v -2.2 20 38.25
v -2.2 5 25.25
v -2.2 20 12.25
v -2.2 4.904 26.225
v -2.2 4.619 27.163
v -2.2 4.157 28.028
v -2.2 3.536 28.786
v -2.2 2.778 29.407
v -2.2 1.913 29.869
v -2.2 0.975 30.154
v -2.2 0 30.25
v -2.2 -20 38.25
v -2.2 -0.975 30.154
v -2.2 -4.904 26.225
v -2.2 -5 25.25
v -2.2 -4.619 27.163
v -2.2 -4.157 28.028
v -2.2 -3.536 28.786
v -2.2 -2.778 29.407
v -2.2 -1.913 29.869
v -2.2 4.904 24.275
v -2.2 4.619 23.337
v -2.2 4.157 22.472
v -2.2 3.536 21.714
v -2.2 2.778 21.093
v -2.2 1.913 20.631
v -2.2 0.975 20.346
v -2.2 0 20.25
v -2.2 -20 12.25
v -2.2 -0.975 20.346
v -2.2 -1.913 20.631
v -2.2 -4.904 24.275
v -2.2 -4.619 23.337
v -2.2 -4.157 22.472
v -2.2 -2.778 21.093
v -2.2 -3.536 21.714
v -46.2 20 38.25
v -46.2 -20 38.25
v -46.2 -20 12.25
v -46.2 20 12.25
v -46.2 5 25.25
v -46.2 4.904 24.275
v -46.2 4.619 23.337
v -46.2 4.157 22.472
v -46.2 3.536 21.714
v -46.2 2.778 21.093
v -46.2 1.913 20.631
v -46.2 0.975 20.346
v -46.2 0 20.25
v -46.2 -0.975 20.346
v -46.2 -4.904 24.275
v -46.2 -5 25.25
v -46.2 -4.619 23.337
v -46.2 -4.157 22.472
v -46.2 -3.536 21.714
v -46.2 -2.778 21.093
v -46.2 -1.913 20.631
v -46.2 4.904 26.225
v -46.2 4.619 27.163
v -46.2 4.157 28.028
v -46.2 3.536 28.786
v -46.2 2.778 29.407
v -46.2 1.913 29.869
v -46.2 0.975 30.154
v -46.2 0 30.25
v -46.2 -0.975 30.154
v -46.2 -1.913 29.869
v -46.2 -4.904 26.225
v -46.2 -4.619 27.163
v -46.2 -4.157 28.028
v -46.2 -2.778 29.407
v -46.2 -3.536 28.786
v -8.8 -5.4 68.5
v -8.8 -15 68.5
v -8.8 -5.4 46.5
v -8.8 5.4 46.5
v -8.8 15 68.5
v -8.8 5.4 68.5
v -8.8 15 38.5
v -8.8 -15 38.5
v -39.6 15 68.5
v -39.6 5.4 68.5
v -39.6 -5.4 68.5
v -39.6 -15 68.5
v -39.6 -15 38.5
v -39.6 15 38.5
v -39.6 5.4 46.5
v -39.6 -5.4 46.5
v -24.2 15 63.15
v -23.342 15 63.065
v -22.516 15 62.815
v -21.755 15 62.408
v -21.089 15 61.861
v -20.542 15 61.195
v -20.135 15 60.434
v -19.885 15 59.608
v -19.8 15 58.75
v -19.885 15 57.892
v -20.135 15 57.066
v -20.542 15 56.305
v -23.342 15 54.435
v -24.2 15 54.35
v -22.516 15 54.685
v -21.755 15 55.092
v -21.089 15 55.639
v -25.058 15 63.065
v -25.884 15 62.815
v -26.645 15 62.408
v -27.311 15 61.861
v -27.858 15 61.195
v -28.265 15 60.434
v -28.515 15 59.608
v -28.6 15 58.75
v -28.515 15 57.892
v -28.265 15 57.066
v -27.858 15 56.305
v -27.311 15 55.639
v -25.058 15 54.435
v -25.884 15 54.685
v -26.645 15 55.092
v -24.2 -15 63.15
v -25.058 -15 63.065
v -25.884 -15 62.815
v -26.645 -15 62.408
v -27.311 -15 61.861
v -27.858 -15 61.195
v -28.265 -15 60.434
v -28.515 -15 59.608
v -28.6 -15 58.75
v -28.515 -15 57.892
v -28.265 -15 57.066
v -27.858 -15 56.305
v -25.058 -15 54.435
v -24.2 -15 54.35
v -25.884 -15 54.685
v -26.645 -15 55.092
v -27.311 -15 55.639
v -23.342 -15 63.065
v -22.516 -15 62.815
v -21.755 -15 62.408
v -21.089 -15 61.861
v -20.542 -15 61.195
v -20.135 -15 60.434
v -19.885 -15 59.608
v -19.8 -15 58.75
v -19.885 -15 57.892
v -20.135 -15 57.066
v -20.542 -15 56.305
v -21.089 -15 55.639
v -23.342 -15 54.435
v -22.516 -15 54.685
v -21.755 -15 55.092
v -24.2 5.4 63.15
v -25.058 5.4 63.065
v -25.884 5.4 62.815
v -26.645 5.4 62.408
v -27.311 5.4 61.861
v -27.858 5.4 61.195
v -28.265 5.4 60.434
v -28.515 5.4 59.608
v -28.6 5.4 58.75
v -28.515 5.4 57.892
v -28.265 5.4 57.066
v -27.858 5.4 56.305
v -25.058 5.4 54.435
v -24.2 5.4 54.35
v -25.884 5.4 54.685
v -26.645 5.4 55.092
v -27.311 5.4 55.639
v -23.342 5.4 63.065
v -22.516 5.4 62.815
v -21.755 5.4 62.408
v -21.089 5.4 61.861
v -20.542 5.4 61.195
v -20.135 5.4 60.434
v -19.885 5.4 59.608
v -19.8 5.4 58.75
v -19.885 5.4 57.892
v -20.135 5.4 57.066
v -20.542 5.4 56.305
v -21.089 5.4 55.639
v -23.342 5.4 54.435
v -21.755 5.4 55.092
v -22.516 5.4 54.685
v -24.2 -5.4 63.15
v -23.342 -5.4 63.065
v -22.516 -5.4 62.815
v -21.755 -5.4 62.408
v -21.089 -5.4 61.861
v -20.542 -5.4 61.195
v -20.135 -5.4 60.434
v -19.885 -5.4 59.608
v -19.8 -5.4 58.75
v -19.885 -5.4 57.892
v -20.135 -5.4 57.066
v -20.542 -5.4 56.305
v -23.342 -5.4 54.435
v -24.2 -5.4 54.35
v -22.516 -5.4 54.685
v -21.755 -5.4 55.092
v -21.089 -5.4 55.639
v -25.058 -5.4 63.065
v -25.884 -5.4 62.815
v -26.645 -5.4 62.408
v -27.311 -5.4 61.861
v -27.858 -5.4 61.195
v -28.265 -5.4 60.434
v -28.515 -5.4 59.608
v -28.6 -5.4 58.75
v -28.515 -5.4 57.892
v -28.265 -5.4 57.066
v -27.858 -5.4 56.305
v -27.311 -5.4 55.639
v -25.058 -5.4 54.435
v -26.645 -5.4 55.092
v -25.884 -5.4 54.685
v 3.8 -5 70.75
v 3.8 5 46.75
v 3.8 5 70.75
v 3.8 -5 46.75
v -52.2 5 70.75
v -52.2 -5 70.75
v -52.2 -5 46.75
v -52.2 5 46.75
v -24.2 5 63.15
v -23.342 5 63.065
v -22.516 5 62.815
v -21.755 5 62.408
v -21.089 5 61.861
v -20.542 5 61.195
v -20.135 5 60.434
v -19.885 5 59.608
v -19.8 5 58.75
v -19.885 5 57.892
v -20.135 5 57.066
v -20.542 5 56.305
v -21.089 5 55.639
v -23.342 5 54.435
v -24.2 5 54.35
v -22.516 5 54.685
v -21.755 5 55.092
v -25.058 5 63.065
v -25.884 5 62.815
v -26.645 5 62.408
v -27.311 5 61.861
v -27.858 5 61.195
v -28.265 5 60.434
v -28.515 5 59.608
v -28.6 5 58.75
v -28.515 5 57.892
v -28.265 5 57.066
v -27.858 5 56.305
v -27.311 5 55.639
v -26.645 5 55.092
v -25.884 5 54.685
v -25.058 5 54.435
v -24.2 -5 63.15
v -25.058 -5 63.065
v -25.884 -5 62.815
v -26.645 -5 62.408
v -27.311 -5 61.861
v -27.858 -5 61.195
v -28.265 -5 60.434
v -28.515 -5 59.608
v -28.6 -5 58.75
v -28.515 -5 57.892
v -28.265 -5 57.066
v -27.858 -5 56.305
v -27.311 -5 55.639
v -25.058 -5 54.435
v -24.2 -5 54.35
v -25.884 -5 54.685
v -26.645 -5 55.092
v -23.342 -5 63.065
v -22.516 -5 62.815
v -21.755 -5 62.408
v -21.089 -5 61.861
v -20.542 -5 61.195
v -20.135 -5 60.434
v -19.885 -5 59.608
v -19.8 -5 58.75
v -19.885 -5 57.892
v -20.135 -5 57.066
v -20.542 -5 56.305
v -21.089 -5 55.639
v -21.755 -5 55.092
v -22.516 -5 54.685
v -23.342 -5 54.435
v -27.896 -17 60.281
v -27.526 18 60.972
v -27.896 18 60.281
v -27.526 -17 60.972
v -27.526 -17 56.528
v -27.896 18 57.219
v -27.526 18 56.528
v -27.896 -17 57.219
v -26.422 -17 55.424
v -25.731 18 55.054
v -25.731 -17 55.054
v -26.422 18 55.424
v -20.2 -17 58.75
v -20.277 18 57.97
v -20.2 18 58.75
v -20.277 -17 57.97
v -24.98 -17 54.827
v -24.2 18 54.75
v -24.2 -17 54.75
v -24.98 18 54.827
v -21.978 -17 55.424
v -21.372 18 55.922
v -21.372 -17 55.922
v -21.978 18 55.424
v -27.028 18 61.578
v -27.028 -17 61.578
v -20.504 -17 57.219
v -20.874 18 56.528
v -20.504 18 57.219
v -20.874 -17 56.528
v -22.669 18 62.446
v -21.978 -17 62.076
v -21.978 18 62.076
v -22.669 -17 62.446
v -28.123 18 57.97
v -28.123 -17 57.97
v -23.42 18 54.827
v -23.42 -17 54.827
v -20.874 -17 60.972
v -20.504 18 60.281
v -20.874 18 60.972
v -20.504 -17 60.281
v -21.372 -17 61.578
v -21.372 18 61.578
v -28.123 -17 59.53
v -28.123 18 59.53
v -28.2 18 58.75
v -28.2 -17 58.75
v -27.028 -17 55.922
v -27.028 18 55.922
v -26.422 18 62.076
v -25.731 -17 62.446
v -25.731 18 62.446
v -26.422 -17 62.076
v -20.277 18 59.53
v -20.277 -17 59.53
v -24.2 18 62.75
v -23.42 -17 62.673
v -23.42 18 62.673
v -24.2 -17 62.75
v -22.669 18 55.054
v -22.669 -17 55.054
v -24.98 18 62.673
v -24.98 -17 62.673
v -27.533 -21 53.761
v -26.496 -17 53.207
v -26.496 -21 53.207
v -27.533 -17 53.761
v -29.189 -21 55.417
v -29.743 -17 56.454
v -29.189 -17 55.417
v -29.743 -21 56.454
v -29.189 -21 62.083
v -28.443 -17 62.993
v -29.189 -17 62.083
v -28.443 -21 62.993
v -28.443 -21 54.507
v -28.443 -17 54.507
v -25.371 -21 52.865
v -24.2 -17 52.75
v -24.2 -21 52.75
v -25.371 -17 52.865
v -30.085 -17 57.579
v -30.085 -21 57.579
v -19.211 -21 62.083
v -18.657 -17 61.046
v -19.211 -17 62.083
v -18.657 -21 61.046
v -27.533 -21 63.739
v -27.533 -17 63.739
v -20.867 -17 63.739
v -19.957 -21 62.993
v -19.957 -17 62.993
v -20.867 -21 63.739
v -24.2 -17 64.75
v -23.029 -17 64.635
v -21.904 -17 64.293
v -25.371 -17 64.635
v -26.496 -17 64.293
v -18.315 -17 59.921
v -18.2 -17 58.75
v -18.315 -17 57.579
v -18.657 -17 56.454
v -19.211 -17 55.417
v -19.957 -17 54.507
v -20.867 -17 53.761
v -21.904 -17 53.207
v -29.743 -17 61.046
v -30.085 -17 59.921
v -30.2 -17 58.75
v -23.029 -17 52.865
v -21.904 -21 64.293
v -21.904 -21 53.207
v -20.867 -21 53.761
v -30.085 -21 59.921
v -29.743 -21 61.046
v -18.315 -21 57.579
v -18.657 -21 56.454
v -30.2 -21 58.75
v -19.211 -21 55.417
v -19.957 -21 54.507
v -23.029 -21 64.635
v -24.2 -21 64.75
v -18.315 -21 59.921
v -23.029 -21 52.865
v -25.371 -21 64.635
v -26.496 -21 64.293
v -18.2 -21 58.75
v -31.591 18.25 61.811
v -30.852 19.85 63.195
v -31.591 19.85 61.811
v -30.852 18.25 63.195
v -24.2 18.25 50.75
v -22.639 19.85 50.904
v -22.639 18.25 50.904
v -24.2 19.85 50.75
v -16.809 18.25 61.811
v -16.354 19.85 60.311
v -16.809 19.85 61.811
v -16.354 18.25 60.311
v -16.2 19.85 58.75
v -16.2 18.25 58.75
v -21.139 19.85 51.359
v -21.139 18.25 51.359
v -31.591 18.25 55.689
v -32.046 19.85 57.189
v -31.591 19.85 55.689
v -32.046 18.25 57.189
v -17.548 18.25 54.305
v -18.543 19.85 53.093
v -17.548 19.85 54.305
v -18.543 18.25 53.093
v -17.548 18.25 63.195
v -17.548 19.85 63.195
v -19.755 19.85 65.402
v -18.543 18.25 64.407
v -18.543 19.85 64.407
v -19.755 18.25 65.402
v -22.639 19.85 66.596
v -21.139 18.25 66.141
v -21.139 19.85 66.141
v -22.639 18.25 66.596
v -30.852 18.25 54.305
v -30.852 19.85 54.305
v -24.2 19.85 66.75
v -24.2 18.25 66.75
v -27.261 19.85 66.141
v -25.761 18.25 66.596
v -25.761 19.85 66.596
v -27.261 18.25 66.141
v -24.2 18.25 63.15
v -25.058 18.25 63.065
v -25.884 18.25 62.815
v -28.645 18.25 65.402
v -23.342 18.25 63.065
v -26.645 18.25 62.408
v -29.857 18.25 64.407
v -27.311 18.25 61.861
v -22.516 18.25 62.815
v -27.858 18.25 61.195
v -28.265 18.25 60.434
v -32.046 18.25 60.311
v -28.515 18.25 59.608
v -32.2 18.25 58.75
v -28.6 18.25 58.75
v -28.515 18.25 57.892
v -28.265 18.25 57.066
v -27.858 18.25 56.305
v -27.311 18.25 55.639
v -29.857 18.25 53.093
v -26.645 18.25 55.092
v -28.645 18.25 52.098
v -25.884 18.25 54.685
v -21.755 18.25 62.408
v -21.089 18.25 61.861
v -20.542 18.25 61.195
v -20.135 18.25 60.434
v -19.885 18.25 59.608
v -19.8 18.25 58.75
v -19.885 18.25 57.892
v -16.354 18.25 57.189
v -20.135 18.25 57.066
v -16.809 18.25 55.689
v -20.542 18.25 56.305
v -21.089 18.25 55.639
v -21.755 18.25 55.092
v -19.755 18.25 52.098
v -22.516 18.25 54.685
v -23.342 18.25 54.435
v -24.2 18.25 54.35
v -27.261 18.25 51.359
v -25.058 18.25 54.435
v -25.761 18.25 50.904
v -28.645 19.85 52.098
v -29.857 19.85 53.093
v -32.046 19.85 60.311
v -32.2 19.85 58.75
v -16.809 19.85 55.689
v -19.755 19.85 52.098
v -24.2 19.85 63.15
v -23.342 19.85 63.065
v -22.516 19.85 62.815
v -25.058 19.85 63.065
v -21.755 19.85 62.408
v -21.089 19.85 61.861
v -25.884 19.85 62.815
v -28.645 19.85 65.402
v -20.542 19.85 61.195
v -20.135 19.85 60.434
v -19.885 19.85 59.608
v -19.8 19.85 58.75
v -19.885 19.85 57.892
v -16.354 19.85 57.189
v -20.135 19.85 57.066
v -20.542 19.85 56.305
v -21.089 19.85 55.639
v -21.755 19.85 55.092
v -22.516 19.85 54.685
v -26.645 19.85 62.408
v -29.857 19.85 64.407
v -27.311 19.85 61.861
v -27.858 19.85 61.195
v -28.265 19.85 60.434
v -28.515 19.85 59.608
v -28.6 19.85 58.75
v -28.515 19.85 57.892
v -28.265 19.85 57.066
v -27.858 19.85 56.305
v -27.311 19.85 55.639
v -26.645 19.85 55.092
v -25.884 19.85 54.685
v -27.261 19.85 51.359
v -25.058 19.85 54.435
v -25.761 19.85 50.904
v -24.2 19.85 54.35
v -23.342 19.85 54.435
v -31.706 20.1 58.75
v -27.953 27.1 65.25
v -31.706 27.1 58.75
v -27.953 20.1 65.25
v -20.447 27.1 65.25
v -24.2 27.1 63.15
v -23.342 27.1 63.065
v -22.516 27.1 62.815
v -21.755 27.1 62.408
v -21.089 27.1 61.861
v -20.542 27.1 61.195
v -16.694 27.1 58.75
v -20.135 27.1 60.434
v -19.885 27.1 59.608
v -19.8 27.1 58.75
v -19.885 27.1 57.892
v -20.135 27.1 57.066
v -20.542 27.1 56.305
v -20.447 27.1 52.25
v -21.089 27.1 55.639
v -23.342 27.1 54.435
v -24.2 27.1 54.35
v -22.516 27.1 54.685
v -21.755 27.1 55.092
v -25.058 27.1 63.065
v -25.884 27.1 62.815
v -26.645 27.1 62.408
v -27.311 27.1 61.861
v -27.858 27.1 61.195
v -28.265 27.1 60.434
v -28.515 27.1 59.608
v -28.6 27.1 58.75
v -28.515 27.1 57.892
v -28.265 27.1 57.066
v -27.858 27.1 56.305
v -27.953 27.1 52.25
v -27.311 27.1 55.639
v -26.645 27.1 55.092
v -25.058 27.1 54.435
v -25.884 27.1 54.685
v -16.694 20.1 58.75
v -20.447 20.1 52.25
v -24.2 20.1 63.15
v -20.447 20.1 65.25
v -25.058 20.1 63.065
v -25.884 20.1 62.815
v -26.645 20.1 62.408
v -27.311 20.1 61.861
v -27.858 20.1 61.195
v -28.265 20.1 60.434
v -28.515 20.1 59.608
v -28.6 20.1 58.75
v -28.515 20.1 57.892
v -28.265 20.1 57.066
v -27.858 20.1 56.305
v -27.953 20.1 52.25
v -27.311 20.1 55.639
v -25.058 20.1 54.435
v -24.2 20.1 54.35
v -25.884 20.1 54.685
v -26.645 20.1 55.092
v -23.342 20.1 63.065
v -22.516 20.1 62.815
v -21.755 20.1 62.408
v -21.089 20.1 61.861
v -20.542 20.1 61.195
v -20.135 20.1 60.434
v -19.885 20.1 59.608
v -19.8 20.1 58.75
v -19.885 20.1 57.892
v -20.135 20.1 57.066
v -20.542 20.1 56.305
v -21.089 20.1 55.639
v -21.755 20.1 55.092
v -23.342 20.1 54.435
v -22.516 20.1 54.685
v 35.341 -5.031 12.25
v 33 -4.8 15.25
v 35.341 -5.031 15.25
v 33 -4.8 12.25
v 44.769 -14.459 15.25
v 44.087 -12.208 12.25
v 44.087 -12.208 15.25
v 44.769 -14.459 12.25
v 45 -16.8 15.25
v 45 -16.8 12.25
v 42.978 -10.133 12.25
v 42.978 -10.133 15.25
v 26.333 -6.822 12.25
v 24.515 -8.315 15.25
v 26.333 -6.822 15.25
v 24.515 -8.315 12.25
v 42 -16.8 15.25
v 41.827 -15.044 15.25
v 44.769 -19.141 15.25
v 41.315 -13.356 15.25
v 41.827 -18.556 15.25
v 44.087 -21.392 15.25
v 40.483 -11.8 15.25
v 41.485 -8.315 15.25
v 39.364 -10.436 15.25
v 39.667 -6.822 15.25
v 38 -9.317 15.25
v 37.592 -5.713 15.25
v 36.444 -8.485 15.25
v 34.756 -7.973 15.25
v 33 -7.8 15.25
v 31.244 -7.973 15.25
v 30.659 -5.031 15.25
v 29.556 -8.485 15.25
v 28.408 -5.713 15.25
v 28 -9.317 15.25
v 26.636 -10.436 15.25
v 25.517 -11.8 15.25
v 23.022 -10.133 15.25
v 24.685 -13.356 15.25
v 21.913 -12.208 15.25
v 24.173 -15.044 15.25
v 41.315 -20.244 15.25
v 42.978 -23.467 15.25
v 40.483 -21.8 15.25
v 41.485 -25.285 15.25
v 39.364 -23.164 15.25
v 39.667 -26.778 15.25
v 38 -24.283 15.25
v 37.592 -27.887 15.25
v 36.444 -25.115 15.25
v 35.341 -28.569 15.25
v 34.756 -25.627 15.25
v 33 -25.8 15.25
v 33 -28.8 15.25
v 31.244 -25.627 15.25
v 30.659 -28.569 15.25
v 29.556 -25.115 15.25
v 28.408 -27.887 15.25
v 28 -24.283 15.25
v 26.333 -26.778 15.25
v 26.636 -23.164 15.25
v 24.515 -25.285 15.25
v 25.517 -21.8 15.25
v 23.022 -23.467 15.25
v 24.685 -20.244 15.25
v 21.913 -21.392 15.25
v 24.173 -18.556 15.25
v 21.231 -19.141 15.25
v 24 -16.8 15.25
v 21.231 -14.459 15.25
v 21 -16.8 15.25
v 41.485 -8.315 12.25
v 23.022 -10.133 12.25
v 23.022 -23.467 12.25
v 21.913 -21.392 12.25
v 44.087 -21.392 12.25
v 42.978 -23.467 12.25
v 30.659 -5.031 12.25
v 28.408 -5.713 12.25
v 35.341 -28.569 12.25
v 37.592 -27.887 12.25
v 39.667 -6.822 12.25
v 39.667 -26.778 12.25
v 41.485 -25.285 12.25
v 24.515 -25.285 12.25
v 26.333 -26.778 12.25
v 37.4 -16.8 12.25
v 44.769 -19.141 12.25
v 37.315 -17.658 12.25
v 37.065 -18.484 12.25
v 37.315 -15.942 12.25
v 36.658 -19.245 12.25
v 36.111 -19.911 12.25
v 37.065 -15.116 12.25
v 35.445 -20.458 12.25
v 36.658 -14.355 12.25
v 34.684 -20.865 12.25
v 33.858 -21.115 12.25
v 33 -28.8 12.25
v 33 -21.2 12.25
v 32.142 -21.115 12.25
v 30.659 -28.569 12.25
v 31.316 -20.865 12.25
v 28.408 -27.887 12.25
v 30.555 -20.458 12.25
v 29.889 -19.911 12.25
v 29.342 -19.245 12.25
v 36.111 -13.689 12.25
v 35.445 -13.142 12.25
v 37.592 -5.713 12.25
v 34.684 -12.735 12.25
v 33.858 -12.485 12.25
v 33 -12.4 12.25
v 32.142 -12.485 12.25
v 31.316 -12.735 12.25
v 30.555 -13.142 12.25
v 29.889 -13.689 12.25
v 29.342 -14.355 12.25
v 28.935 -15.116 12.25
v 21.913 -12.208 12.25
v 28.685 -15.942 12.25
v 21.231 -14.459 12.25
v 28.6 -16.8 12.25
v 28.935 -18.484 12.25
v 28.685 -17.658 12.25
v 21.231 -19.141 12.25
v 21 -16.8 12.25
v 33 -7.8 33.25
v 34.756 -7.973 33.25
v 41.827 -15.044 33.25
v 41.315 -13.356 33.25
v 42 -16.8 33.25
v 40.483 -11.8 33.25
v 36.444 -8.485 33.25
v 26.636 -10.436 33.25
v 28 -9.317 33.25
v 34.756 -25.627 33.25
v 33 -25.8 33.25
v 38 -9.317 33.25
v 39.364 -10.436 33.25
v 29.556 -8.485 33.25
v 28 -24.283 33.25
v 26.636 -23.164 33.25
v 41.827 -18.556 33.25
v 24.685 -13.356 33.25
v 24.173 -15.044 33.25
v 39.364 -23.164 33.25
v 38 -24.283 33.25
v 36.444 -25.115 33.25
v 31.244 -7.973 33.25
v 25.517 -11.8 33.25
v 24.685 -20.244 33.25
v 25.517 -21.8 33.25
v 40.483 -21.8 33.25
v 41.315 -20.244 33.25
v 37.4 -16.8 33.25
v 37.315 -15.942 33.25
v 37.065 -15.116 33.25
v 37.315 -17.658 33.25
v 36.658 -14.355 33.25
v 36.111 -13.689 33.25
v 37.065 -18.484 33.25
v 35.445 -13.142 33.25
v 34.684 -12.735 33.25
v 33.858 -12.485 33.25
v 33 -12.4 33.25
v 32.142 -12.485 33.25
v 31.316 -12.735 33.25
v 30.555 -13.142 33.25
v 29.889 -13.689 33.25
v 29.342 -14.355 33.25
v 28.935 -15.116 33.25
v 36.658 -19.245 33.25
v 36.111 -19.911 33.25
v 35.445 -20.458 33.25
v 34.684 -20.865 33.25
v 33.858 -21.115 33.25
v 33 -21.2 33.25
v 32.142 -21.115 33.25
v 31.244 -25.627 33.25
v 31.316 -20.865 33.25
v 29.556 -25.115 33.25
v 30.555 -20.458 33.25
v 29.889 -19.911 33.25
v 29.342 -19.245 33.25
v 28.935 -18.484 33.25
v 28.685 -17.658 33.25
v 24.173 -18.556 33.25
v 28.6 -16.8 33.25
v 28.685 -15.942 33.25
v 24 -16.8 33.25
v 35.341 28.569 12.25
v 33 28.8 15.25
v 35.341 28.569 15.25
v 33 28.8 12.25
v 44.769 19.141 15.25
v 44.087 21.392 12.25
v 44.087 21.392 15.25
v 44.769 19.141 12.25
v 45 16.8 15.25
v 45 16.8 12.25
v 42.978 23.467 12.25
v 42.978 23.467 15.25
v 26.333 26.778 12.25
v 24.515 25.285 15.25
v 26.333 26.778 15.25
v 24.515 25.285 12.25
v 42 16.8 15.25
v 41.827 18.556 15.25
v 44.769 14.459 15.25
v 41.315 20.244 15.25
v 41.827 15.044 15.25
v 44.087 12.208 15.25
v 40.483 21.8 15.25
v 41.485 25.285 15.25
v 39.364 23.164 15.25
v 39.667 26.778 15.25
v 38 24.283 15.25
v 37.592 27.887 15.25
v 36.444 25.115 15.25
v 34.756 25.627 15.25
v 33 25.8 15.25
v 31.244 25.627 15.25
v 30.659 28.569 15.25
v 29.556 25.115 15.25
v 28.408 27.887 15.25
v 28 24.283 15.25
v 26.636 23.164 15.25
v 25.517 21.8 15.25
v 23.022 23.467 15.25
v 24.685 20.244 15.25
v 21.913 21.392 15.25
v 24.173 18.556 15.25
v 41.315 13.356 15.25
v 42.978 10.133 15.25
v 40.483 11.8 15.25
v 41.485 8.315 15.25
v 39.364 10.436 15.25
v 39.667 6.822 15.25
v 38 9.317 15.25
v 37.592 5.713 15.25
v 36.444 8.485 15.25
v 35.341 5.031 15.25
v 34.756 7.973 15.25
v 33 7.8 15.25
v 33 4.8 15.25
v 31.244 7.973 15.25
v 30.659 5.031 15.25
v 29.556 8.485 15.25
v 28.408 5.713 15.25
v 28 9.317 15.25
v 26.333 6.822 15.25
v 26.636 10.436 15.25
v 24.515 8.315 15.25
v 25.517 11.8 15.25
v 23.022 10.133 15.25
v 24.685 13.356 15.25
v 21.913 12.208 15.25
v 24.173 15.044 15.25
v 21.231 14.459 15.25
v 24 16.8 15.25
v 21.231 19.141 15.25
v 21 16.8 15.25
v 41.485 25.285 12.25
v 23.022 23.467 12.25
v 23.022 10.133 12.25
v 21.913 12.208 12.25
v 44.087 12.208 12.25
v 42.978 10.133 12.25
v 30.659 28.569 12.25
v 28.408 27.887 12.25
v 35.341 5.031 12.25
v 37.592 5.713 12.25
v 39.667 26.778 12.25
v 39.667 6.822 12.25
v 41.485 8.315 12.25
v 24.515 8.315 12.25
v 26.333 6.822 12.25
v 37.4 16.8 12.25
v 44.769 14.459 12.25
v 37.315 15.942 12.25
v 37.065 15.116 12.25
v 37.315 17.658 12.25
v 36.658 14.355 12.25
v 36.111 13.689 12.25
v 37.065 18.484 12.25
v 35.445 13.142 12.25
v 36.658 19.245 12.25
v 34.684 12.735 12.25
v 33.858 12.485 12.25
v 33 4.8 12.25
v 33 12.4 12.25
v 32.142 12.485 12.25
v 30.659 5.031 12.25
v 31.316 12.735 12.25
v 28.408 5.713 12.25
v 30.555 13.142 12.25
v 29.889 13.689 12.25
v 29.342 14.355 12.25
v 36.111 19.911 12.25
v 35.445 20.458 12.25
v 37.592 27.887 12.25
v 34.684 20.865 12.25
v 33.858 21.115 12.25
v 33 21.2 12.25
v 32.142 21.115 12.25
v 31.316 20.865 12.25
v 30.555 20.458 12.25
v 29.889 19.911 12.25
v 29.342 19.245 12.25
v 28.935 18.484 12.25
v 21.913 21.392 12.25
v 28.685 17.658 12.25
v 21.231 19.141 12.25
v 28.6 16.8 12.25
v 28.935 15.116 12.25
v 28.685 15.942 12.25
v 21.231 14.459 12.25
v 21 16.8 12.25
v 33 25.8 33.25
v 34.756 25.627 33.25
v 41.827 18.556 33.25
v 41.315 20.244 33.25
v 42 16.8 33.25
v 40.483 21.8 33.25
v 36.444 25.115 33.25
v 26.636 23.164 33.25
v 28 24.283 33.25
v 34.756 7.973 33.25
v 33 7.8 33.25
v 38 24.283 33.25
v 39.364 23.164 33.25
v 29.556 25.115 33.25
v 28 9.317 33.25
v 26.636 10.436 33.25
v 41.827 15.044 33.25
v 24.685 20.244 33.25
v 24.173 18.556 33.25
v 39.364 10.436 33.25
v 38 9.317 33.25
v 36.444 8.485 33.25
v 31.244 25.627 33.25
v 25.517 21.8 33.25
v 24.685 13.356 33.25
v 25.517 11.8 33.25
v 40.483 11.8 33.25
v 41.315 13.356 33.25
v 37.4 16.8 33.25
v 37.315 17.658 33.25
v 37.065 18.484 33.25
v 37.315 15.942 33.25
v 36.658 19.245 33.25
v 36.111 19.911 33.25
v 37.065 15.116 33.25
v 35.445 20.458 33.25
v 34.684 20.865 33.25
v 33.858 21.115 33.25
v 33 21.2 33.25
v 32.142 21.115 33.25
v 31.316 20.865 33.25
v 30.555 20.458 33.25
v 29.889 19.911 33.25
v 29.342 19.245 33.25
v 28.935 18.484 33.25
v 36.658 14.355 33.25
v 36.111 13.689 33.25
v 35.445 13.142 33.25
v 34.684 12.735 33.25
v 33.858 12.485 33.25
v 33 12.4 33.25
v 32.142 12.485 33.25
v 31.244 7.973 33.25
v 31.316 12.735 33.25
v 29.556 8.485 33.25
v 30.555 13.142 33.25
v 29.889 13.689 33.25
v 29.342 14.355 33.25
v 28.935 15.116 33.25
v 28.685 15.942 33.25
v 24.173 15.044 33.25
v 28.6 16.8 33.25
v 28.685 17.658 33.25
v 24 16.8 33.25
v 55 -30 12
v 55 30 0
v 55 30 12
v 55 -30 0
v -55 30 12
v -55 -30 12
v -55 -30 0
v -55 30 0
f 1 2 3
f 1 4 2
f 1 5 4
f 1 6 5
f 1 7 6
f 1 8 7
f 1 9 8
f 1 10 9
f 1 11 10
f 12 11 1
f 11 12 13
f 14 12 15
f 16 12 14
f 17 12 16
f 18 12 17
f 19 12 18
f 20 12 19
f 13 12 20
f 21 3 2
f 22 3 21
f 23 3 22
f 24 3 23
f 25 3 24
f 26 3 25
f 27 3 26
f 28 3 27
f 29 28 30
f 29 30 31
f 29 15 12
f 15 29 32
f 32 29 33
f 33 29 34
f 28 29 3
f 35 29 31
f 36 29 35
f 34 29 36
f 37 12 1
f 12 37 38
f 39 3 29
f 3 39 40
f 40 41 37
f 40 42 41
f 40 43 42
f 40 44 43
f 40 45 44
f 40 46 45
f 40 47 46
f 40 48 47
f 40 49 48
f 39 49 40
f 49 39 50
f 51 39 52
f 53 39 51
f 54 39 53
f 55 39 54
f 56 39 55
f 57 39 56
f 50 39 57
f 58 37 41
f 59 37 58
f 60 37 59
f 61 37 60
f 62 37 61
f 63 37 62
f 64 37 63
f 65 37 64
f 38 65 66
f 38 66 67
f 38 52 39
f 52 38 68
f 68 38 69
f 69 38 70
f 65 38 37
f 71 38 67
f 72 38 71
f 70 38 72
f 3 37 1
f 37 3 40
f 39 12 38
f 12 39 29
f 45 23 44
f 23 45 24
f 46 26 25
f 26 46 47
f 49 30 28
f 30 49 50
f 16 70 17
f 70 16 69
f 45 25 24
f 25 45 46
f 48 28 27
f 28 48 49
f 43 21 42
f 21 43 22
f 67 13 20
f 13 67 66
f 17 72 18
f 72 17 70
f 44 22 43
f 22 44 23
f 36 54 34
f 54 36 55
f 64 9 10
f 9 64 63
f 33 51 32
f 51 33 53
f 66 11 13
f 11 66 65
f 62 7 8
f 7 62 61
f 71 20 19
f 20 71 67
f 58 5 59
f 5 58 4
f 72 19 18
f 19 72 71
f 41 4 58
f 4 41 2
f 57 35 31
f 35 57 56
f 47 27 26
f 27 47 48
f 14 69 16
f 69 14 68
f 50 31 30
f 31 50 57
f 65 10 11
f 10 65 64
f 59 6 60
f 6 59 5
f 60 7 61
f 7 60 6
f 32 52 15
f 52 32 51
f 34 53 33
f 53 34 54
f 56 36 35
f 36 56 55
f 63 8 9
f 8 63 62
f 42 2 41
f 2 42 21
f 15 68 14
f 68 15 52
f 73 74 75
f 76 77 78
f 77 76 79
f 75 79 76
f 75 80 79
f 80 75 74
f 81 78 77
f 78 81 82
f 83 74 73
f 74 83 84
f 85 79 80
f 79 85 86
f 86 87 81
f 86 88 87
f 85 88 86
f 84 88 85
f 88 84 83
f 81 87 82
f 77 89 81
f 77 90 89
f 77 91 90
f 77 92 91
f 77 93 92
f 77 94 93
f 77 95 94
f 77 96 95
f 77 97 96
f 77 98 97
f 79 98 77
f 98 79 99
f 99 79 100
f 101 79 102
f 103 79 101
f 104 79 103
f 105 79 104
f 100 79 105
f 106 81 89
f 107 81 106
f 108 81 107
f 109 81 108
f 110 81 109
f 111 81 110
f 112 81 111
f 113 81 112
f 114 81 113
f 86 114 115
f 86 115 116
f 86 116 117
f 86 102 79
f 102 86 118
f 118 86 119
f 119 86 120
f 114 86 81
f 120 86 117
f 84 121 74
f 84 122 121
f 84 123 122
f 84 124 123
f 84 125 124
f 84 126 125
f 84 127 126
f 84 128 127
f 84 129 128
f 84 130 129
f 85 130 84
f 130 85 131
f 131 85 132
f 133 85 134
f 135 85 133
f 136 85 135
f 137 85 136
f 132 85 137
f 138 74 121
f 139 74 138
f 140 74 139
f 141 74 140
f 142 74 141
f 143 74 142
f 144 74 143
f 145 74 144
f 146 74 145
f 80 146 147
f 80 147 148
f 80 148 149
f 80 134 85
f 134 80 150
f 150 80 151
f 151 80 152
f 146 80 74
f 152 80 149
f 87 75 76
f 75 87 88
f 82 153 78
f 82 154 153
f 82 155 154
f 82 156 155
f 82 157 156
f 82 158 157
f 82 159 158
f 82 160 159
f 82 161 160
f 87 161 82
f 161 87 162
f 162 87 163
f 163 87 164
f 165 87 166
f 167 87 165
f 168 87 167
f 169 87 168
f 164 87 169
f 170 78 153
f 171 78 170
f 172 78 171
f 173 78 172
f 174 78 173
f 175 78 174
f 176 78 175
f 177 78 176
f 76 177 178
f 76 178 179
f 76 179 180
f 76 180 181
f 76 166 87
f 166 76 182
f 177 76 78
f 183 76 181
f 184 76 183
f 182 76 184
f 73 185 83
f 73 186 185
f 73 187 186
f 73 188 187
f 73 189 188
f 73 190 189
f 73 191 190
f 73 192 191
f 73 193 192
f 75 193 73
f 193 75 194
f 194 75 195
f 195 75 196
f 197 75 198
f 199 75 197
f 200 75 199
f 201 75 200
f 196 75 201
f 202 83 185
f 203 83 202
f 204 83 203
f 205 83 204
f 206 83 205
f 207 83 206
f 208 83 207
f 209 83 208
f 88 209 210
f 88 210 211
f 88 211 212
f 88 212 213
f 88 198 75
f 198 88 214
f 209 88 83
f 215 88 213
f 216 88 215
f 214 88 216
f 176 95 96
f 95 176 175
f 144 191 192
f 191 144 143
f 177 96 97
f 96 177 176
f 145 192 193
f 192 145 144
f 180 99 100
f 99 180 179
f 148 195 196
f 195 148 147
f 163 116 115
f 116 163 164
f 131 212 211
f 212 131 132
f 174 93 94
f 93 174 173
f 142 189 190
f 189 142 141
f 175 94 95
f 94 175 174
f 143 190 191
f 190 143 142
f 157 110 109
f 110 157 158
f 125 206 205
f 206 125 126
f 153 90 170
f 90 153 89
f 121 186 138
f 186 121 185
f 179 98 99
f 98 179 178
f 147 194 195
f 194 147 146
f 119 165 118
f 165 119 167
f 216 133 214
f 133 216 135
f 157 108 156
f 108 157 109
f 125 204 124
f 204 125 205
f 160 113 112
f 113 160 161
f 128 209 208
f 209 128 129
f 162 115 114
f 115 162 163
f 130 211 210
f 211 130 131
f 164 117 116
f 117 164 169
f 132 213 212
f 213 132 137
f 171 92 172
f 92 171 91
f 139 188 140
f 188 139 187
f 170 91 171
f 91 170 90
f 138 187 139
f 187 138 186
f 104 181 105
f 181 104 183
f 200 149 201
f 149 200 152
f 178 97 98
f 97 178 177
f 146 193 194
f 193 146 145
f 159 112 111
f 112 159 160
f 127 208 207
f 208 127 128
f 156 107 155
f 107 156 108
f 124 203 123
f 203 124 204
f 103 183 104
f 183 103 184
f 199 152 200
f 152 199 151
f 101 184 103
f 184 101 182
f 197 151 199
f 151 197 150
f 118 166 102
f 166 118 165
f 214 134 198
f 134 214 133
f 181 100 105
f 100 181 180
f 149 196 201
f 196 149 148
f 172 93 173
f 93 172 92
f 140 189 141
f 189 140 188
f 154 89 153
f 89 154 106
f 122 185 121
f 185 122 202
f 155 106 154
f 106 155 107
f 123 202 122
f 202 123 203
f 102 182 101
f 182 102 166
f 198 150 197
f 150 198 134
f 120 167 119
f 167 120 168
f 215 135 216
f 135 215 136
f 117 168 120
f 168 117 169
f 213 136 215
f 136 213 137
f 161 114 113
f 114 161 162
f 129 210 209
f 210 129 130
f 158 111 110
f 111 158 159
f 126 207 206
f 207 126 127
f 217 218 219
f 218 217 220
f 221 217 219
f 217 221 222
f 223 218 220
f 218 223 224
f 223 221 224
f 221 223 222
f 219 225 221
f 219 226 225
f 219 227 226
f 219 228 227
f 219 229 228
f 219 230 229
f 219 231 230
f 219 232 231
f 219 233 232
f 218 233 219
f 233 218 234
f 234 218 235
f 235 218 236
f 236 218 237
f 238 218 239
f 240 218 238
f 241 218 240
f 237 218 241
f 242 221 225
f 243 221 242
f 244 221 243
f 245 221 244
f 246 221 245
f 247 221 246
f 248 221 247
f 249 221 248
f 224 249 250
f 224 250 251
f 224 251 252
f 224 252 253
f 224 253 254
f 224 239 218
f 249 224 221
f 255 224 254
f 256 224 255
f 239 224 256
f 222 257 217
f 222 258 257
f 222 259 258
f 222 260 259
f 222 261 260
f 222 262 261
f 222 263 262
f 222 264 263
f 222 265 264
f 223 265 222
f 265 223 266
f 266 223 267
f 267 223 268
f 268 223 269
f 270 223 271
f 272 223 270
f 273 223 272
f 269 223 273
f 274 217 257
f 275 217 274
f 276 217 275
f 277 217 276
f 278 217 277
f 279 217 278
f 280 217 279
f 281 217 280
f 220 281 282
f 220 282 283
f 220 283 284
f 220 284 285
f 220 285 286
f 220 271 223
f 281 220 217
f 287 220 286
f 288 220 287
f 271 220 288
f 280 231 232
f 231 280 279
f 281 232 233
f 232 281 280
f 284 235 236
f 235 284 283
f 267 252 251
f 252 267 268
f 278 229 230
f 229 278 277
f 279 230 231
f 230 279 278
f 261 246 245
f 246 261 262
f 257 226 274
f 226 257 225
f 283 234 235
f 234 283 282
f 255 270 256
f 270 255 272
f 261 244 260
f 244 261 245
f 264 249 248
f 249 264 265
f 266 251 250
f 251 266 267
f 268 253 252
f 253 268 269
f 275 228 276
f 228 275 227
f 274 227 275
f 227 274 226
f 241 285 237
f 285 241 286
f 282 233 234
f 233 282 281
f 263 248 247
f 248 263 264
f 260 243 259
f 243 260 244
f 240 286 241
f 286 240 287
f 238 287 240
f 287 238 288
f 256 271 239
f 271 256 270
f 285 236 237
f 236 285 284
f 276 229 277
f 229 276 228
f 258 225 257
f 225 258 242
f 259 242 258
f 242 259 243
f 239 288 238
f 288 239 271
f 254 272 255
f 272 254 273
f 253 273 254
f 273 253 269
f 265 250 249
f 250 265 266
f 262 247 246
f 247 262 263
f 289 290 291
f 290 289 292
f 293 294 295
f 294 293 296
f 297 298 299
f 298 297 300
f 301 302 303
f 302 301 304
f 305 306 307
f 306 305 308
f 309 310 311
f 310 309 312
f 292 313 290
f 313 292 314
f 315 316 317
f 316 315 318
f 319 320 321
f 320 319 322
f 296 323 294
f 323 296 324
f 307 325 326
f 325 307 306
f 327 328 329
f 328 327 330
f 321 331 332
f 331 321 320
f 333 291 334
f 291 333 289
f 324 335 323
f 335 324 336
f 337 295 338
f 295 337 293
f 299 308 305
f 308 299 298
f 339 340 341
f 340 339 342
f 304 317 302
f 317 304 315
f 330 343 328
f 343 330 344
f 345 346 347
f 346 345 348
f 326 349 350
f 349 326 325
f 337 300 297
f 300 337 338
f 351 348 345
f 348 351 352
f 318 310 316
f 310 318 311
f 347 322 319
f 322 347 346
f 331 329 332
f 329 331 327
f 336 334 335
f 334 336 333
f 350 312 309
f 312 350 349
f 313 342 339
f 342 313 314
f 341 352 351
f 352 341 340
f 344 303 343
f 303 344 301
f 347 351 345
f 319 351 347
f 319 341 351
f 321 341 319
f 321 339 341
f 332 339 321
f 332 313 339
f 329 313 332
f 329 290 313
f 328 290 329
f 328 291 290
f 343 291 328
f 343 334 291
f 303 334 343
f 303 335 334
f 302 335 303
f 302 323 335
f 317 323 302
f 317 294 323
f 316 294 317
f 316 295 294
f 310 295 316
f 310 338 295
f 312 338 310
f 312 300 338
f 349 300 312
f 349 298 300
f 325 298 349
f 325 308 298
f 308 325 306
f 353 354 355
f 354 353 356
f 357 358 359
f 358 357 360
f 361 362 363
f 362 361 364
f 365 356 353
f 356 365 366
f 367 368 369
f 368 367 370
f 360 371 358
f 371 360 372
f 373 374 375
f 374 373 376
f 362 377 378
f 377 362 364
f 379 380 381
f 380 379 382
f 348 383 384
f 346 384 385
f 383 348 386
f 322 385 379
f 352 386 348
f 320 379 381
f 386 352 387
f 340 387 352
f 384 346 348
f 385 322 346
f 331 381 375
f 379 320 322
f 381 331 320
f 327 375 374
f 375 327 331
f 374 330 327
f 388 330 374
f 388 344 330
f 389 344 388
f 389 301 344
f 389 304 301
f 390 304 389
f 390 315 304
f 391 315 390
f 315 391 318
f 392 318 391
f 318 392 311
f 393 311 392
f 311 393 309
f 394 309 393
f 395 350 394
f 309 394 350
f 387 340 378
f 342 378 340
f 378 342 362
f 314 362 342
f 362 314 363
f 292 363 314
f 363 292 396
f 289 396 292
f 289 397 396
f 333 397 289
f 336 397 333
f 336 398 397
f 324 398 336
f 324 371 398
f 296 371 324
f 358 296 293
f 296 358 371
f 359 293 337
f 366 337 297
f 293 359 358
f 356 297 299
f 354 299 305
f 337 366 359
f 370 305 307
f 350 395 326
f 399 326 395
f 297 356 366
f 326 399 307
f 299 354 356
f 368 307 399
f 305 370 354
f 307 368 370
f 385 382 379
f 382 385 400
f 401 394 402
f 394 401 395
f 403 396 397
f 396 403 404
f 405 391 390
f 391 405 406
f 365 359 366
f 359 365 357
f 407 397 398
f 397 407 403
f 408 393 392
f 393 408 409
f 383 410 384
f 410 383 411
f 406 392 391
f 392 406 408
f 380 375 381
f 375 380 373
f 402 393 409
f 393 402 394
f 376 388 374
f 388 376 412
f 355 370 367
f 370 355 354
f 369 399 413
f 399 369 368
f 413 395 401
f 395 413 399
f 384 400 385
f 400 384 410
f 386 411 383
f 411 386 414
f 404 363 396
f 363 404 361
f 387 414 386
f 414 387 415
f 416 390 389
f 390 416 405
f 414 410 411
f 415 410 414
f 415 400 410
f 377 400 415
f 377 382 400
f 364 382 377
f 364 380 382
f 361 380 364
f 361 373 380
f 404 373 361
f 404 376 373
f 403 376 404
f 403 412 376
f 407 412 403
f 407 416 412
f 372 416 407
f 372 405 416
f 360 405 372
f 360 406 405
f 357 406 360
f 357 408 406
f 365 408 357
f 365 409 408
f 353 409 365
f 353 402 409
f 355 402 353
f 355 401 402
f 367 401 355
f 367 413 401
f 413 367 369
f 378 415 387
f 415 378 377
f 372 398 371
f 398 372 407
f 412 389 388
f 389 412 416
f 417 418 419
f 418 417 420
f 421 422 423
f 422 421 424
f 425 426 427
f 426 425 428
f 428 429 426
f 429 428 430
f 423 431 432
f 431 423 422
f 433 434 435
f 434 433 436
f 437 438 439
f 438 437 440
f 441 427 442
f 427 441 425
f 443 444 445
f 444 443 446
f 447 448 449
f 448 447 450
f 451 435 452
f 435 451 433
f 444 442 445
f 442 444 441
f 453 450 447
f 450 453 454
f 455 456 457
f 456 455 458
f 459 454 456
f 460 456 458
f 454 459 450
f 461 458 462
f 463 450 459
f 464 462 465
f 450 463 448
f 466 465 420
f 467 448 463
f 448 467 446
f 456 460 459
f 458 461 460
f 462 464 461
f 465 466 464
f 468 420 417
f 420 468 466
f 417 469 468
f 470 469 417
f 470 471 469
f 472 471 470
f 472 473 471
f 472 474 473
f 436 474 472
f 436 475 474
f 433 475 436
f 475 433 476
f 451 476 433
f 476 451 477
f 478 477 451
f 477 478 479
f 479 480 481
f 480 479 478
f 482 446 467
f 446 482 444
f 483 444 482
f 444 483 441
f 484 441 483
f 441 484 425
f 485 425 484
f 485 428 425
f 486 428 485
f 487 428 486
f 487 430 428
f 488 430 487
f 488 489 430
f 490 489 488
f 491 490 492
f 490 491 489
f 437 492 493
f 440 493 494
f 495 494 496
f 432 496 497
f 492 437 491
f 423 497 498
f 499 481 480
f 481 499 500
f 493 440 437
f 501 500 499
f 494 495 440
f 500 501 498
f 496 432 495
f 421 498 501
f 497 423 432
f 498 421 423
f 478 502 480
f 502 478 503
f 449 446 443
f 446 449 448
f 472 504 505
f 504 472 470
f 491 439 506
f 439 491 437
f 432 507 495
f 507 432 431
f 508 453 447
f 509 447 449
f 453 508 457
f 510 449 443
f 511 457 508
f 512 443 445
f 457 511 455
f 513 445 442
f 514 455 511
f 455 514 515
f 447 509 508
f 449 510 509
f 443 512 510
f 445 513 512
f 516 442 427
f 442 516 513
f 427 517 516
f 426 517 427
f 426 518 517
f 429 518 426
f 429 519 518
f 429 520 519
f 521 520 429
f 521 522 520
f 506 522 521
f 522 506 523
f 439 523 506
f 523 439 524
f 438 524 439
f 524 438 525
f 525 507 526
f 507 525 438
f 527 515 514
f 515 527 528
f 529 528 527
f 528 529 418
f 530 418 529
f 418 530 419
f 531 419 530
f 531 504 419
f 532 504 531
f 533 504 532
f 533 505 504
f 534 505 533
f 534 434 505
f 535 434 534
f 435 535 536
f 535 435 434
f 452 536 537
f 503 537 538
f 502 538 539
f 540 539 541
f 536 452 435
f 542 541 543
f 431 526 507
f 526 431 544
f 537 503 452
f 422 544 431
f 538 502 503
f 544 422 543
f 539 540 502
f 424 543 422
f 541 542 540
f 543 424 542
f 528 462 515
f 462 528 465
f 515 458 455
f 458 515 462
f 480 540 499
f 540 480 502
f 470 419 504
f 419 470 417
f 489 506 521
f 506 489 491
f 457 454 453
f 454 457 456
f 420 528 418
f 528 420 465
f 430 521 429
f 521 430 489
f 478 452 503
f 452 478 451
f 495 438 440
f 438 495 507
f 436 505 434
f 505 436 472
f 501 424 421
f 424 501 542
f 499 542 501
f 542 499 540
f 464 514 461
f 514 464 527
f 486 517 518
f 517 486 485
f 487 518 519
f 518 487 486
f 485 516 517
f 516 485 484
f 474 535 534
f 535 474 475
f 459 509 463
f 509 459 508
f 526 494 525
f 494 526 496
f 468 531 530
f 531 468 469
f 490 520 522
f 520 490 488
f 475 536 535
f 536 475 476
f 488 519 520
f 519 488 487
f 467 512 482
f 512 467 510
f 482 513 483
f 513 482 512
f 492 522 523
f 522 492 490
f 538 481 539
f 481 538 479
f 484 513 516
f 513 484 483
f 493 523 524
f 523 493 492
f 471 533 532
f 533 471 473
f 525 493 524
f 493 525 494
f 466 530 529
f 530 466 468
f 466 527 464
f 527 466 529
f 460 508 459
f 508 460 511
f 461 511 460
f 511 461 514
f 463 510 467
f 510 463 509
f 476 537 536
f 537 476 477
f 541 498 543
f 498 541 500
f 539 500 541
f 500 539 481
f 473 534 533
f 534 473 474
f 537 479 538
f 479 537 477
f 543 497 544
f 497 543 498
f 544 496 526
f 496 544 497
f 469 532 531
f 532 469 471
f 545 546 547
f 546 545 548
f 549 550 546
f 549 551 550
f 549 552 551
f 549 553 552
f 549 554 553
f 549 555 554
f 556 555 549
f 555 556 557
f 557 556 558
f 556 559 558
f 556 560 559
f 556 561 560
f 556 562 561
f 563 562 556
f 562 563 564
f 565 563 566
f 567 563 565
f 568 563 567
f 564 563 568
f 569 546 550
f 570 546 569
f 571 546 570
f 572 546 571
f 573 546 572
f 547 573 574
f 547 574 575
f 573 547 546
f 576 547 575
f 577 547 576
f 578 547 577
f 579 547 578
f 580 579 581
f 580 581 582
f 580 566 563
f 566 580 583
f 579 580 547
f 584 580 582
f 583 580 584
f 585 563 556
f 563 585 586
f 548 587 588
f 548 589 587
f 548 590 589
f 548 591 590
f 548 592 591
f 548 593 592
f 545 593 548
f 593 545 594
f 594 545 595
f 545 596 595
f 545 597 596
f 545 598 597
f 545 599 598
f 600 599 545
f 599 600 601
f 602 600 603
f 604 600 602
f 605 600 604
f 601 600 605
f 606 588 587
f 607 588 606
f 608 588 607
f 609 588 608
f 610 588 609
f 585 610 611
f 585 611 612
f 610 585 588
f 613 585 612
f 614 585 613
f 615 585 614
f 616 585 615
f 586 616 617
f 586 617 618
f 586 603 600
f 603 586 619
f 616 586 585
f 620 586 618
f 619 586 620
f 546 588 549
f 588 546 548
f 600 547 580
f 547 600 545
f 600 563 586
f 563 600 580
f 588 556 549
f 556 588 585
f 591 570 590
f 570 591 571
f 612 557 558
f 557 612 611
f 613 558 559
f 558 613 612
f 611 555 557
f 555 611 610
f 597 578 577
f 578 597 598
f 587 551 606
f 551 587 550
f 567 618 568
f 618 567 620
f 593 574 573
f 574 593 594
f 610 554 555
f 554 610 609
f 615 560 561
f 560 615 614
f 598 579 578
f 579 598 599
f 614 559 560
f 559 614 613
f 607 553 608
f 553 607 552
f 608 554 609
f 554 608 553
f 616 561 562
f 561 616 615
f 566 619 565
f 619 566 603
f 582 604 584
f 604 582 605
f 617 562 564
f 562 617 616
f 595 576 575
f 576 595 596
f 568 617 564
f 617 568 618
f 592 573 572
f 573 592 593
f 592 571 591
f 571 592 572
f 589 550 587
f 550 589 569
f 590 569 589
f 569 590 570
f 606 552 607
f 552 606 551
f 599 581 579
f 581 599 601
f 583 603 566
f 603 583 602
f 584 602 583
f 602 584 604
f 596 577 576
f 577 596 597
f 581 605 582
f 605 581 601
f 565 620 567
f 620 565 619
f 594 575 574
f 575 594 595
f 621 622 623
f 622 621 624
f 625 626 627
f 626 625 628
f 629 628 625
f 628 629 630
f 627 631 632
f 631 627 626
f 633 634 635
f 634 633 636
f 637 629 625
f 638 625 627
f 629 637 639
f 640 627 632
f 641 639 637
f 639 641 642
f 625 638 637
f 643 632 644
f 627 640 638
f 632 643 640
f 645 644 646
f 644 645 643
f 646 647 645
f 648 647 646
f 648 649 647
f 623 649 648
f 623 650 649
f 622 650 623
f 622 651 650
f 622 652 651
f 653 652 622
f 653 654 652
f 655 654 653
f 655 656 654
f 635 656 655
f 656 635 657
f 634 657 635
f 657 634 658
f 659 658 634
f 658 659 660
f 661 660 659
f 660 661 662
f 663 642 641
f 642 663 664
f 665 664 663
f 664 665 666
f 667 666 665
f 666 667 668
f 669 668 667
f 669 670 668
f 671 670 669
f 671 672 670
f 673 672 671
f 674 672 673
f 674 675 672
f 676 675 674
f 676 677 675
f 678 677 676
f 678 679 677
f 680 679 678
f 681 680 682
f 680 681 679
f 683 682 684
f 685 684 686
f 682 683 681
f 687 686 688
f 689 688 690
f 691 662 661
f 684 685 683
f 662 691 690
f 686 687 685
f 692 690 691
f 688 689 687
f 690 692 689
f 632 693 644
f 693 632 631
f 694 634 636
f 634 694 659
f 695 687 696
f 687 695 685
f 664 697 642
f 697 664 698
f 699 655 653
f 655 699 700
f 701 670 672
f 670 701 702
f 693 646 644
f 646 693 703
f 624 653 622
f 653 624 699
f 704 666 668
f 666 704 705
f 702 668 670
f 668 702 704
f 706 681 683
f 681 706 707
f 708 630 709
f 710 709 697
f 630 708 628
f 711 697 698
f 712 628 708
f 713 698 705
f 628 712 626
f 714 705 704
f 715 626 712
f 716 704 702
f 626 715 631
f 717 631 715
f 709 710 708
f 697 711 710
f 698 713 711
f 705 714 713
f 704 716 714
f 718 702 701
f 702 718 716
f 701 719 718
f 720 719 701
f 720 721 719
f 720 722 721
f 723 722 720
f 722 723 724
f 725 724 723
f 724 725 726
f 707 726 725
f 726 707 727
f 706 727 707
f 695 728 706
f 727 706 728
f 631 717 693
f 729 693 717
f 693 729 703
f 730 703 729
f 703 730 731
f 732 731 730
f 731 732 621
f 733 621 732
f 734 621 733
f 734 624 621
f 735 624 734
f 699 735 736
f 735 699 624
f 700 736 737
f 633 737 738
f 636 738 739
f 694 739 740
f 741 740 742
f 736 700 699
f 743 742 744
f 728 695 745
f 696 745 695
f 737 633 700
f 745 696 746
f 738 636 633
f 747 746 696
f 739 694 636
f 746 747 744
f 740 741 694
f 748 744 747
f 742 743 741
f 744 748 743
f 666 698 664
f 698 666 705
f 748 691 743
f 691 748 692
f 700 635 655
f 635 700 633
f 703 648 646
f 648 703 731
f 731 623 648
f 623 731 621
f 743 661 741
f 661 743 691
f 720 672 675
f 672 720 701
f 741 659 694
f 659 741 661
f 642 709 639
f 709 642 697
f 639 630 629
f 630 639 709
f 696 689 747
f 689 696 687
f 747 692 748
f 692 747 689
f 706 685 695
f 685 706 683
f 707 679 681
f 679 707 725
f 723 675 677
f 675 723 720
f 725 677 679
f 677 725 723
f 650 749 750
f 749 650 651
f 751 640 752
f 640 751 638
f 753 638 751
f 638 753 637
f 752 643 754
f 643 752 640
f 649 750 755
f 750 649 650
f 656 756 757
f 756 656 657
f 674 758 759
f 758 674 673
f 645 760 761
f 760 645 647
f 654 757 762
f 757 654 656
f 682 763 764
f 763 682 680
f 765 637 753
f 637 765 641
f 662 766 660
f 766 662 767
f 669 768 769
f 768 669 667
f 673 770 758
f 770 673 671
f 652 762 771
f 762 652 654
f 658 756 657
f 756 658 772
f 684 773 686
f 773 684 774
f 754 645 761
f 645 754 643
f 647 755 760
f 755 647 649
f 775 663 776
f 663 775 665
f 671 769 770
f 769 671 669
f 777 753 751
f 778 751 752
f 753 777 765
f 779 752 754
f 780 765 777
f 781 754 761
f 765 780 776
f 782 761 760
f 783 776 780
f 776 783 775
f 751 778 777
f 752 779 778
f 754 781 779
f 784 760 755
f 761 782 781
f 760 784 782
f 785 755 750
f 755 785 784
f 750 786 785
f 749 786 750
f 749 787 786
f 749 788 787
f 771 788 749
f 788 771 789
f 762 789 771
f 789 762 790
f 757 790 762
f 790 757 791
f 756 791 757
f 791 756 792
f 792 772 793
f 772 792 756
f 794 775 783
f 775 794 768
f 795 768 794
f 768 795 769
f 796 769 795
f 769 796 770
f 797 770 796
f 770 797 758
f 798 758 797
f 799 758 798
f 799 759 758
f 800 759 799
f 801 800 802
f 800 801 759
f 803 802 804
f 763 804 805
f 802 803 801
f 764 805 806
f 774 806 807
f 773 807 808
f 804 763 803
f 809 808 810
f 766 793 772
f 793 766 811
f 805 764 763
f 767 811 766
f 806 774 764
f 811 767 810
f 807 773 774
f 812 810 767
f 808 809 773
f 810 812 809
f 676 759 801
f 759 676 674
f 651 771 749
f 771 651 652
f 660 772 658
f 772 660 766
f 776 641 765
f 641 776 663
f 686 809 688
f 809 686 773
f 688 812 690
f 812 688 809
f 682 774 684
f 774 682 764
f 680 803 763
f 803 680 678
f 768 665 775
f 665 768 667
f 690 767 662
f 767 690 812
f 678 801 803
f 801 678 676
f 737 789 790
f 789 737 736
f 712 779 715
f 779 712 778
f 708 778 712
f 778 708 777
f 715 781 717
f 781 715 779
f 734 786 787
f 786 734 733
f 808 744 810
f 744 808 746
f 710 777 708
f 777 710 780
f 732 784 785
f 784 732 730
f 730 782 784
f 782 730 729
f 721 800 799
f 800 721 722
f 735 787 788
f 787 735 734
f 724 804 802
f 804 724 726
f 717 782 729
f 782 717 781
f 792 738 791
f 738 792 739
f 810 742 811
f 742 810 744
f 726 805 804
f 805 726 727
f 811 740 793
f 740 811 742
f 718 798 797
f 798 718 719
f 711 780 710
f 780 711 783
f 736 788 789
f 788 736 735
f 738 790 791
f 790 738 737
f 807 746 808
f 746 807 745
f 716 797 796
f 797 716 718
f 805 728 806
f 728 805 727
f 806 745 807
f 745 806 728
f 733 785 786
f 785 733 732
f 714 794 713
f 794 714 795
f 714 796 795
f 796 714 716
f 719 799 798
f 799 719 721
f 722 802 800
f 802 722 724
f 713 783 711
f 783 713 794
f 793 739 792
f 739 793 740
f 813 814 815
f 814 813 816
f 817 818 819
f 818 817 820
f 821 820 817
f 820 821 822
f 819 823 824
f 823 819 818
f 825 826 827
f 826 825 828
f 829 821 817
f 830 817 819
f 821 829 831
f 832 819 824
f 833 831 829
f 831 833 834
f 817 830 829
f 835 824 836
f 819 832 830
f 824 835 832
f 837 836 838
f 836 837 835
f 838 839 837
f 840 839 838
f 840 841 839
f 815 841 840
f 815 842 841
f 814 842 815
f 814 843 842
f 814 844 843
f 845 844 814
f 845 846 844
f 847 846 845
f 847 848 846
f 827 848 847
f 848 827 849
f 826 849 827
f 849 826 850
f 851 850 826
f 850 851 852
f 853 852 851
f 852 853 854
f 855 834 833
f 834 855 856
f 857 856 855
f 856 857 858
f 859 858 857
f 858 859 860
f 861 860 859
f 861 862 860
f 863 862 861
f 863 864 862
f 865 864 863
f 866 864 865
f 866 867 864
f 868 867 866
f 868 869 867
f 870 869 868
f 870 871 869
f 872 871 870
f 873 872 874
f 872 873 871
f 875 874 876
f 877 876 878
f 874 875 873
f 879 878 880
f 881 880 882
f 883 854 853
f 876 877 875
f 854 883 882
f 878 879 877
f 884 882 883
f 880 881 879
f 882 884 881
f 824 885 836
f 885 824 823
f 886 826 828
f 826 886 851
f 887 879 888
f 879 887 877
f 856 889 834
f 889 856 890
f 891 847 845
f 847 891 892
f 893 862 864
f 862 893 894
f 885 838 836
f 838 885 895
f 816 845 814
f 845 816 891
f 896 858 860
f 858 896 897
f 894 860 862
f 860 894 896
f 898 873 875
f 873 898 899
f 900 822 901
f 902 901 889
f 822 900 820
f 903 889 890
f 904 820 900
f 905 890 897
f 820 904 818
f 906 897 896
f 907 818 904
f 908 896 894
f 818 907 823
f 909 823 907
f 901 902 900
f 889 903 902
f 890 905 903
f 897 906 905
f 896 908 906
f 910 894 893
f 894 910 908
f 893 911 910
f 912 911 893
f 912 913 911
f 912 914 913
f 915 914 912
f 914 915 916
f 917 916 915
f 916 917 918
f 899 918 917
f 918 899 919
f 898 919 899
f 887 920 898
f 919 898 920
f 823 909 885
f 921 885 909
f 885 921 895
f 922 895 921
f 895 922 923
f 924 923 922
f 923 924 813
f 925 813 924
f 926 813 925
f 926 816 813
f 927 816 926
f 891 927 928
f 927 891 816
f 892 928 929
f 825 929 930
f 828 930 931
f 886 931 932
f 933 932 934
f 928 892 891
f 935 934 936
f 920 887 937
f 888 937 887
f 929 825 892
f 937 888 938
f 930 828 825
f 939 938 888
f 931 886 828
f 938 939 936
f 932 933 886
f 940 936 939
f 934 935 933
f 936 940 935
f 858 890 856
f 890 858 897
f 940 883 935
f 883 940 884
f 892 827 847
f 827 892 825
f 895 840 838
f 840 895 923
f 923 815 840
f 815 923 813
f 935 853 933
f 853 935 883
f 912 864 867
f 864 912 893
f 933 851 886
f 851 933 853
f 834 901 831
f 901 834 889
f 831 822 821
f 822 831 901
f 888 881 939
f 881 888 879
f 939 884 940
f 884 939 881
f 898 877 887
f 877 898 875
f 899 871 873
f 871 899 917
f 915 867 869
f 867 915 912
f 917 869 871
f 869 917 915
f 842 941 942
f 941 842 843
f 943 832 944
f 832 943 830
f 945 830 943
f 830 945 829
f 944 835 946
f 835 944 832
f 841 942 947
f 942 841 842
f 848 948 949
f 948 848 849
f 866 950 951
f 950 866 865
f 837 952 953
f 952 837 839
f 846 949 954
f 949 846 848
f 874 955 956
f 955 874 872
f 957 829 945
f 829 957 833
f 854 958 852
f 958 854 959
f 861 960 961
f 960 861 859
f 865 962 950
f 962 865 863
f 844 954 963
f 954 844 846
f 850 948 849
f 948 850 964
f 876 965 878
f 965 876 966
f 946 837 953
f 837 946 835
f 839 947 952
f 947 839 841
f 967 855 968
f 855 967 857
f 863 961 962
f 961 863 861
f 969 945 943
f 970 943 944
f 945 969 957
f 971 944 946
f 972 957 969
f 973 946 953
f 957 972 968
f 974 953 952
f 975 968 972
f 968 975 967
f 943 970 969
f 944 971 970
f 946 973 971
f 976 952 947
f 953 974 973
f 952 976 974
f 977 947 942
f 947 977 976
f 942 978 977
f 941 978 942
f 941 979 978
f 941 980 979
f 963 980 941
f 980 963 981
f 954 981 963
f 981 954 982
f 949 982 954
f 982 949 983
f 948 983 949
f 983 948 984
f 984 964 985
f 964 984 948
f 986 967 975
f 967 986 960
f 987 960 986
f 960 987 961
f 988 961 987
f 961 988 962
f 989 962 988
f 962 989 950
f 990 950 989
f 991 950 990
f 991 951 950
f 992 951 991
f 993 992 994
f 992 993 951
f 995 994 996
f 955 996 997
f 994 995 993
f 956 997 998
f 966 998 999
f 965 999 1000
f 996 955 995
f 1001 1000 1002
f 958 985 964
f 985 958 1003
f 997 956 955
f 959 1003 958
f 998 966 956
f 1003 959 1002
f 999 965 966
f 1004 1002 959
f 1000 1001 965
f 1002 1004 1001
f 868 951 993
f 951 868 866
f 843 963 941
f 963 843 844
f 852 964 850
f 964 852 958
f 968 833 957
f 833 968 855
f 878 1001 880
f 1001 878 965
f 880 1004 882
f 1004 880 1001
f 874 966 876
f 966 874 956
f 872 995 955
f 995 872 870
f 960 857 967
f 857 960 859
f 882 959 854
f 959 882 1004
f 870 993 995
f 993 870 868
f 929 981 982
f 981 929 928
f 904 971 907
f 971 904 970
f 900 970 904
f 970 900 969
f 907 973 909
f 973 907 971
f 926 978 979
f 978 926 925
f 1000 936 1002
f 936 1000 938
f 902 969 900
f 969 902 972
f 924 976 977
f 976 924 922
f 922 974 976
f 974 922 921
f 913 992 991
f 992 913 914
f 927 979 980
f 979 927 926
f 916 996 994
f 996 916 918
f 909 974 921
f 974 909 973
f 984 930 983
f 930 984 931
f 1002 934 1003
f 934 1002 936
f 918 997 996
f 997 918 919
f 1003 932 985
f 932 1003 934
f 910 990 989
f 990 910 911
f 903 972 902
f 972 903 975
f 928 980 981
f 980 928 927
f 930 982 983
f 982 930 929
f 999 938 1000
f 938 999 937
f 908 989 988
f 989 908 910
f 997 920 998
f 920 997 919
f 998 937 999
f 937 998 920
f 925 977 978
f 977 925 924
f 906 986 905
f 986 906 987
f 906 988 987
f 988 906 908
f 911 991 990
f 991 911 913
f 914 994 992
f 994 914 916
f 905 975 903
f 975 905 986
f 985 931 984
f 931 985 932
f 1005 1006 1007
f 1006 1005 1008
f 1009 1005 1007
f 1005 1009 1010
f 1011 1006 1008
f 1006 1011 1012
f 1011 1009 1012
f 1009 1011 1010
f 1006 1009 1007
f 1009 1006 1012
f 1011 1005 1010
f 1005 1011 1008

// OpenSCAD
$fn = 32;

// ------------------------------------------------------------------------
// Indexing jig: plate 110 x 60 mm, pin d8
// Every part is its own module, assembly() places every instance.
// ------------------------------------------------------------------------

// --- part 1 ---
module jig_plate() {
  difference() {
    translate([-55, -30, 0]) cube([110, 60, 12]);
  }
}

// --- part 2 ---
module locator_block() {
  difference() {
    translate([-22, -20, 0]) cube([44, 40, 26]);
    translate([0, 0, 13]) rotate([0, 90, 0]) cylinder(h = 46, d = 10, center = true);
  }
}

// --- part 3 ---
module index_fork() {
  difference() {
    translate([-15.4, -15, 0]) cube([30.8, 30, 30]);
    translate([-16.4, -5.4, 8]) cube([32.8, 10.8, 23]);
    translate([0, 0, 20.25]) rotate([90, 0, 0]) cylinder(h = 32, d = 8.8, center = true);
  }
}

// --- part 4 ---
module index_arm() {
  difference() {
    translate([-28, -5, 0]) cube([56, 10, 24]);
    translate([0, 0, 12]) rotate([90, 0, 0]) cylinder(h = 12, d = 8.8, center = true);
  }
}

// --- part 5 ---
module index_pin() {
  rotate([0, 90, 0]) cylinder(h = 36, d = 8, center = true);
  translate([-21, 0, 0]) rotate([0, 90, 0]) cylinder(h = 4, d = 12);
}

// --- part 6 ---
module pin_washer() {
  difference() {
      translate([0, 0, 0]) cylinder(h = 1.6, d = 16);
      translate([0, 0, -1]) cylinder(h = 3.6, d = 8.8);
    }
}

// --- part 7 ---
module lock_nut() {
  difference() {
    linear_extrude(height = 7) polygon(points = [[7.506, 0], [3.753, 6.5], [-3.753, 6.5], [-7.506, 0], [-3.753, -6.5], [3.753, -6.5]]);
    translate([0, 0, -1]) cylinder(h = 9, d = 8.8);
  }
}

// --- part 8 ---
module guide_bush_a() {
  difference() {
    union() {
      cylinder(h = 3, d = 24);
      translate([0, 0, 3]) cylinder(h = 18, d = 18);
    }
    translate([0, 0, -1]) cylinder(h = 23, d = 8.8);
  }
}

// --- part 9 ---
module guide_bush_b() {
  difference() {
    union() {
      cylinder(h = 3, d = 24);
      translate([0, 0, 3]) cylinder(h = 18, d = 18);
    }
    translate([0, 0, -1]) cylinder(h = 23, d = 8.8);
  }
}

// --- assembly ---
module assembly() {
  color([0.80, 0.24, 0.20]) translate([0, 0, 0]) rotate([0, 0, 0]) jig_plate();
  color([0.20, 0.45, 0.75]) translate([-24.2, 0, 12.25]) rotate([0, 0, 0]) locator_block();
  color([0.25, 0.62, 0.32]) translate([-24.2, 0, 38.5]) rotate([0, 0, 0]) index_fork();
  color([0.92, 0.70, 0.18]) translate([-24.2, 0, 46.75]) rotate([0, 0, 0]) index_arm();
  color([0.58, 0.35, 0.70]) translate([-24.2, 0, 58.75]) rotate([0, 0, 90]) index_pin();
  color([0.16, 0.66, 0.66]) translate([-24.2, 19.85, 58.75]) rotate([90, 0, 0]) pin_washer();
  color([0.85, 0.48, 0.18]) translate([-24.2, 27.1, 58.75]) rotate([90, 0, 0]) lock_nut();
  color([0.55, 0.60, 0.65]) translate([33, -16.8, 12.25]) rotate([0, 0, 0]) guide_bush_a();
  color([0.75, 0.30, 0.55]) translate([33, 16.8, 12.25]) rotate([0, 0, 0]) guide_bush_b();
}

assembly();
